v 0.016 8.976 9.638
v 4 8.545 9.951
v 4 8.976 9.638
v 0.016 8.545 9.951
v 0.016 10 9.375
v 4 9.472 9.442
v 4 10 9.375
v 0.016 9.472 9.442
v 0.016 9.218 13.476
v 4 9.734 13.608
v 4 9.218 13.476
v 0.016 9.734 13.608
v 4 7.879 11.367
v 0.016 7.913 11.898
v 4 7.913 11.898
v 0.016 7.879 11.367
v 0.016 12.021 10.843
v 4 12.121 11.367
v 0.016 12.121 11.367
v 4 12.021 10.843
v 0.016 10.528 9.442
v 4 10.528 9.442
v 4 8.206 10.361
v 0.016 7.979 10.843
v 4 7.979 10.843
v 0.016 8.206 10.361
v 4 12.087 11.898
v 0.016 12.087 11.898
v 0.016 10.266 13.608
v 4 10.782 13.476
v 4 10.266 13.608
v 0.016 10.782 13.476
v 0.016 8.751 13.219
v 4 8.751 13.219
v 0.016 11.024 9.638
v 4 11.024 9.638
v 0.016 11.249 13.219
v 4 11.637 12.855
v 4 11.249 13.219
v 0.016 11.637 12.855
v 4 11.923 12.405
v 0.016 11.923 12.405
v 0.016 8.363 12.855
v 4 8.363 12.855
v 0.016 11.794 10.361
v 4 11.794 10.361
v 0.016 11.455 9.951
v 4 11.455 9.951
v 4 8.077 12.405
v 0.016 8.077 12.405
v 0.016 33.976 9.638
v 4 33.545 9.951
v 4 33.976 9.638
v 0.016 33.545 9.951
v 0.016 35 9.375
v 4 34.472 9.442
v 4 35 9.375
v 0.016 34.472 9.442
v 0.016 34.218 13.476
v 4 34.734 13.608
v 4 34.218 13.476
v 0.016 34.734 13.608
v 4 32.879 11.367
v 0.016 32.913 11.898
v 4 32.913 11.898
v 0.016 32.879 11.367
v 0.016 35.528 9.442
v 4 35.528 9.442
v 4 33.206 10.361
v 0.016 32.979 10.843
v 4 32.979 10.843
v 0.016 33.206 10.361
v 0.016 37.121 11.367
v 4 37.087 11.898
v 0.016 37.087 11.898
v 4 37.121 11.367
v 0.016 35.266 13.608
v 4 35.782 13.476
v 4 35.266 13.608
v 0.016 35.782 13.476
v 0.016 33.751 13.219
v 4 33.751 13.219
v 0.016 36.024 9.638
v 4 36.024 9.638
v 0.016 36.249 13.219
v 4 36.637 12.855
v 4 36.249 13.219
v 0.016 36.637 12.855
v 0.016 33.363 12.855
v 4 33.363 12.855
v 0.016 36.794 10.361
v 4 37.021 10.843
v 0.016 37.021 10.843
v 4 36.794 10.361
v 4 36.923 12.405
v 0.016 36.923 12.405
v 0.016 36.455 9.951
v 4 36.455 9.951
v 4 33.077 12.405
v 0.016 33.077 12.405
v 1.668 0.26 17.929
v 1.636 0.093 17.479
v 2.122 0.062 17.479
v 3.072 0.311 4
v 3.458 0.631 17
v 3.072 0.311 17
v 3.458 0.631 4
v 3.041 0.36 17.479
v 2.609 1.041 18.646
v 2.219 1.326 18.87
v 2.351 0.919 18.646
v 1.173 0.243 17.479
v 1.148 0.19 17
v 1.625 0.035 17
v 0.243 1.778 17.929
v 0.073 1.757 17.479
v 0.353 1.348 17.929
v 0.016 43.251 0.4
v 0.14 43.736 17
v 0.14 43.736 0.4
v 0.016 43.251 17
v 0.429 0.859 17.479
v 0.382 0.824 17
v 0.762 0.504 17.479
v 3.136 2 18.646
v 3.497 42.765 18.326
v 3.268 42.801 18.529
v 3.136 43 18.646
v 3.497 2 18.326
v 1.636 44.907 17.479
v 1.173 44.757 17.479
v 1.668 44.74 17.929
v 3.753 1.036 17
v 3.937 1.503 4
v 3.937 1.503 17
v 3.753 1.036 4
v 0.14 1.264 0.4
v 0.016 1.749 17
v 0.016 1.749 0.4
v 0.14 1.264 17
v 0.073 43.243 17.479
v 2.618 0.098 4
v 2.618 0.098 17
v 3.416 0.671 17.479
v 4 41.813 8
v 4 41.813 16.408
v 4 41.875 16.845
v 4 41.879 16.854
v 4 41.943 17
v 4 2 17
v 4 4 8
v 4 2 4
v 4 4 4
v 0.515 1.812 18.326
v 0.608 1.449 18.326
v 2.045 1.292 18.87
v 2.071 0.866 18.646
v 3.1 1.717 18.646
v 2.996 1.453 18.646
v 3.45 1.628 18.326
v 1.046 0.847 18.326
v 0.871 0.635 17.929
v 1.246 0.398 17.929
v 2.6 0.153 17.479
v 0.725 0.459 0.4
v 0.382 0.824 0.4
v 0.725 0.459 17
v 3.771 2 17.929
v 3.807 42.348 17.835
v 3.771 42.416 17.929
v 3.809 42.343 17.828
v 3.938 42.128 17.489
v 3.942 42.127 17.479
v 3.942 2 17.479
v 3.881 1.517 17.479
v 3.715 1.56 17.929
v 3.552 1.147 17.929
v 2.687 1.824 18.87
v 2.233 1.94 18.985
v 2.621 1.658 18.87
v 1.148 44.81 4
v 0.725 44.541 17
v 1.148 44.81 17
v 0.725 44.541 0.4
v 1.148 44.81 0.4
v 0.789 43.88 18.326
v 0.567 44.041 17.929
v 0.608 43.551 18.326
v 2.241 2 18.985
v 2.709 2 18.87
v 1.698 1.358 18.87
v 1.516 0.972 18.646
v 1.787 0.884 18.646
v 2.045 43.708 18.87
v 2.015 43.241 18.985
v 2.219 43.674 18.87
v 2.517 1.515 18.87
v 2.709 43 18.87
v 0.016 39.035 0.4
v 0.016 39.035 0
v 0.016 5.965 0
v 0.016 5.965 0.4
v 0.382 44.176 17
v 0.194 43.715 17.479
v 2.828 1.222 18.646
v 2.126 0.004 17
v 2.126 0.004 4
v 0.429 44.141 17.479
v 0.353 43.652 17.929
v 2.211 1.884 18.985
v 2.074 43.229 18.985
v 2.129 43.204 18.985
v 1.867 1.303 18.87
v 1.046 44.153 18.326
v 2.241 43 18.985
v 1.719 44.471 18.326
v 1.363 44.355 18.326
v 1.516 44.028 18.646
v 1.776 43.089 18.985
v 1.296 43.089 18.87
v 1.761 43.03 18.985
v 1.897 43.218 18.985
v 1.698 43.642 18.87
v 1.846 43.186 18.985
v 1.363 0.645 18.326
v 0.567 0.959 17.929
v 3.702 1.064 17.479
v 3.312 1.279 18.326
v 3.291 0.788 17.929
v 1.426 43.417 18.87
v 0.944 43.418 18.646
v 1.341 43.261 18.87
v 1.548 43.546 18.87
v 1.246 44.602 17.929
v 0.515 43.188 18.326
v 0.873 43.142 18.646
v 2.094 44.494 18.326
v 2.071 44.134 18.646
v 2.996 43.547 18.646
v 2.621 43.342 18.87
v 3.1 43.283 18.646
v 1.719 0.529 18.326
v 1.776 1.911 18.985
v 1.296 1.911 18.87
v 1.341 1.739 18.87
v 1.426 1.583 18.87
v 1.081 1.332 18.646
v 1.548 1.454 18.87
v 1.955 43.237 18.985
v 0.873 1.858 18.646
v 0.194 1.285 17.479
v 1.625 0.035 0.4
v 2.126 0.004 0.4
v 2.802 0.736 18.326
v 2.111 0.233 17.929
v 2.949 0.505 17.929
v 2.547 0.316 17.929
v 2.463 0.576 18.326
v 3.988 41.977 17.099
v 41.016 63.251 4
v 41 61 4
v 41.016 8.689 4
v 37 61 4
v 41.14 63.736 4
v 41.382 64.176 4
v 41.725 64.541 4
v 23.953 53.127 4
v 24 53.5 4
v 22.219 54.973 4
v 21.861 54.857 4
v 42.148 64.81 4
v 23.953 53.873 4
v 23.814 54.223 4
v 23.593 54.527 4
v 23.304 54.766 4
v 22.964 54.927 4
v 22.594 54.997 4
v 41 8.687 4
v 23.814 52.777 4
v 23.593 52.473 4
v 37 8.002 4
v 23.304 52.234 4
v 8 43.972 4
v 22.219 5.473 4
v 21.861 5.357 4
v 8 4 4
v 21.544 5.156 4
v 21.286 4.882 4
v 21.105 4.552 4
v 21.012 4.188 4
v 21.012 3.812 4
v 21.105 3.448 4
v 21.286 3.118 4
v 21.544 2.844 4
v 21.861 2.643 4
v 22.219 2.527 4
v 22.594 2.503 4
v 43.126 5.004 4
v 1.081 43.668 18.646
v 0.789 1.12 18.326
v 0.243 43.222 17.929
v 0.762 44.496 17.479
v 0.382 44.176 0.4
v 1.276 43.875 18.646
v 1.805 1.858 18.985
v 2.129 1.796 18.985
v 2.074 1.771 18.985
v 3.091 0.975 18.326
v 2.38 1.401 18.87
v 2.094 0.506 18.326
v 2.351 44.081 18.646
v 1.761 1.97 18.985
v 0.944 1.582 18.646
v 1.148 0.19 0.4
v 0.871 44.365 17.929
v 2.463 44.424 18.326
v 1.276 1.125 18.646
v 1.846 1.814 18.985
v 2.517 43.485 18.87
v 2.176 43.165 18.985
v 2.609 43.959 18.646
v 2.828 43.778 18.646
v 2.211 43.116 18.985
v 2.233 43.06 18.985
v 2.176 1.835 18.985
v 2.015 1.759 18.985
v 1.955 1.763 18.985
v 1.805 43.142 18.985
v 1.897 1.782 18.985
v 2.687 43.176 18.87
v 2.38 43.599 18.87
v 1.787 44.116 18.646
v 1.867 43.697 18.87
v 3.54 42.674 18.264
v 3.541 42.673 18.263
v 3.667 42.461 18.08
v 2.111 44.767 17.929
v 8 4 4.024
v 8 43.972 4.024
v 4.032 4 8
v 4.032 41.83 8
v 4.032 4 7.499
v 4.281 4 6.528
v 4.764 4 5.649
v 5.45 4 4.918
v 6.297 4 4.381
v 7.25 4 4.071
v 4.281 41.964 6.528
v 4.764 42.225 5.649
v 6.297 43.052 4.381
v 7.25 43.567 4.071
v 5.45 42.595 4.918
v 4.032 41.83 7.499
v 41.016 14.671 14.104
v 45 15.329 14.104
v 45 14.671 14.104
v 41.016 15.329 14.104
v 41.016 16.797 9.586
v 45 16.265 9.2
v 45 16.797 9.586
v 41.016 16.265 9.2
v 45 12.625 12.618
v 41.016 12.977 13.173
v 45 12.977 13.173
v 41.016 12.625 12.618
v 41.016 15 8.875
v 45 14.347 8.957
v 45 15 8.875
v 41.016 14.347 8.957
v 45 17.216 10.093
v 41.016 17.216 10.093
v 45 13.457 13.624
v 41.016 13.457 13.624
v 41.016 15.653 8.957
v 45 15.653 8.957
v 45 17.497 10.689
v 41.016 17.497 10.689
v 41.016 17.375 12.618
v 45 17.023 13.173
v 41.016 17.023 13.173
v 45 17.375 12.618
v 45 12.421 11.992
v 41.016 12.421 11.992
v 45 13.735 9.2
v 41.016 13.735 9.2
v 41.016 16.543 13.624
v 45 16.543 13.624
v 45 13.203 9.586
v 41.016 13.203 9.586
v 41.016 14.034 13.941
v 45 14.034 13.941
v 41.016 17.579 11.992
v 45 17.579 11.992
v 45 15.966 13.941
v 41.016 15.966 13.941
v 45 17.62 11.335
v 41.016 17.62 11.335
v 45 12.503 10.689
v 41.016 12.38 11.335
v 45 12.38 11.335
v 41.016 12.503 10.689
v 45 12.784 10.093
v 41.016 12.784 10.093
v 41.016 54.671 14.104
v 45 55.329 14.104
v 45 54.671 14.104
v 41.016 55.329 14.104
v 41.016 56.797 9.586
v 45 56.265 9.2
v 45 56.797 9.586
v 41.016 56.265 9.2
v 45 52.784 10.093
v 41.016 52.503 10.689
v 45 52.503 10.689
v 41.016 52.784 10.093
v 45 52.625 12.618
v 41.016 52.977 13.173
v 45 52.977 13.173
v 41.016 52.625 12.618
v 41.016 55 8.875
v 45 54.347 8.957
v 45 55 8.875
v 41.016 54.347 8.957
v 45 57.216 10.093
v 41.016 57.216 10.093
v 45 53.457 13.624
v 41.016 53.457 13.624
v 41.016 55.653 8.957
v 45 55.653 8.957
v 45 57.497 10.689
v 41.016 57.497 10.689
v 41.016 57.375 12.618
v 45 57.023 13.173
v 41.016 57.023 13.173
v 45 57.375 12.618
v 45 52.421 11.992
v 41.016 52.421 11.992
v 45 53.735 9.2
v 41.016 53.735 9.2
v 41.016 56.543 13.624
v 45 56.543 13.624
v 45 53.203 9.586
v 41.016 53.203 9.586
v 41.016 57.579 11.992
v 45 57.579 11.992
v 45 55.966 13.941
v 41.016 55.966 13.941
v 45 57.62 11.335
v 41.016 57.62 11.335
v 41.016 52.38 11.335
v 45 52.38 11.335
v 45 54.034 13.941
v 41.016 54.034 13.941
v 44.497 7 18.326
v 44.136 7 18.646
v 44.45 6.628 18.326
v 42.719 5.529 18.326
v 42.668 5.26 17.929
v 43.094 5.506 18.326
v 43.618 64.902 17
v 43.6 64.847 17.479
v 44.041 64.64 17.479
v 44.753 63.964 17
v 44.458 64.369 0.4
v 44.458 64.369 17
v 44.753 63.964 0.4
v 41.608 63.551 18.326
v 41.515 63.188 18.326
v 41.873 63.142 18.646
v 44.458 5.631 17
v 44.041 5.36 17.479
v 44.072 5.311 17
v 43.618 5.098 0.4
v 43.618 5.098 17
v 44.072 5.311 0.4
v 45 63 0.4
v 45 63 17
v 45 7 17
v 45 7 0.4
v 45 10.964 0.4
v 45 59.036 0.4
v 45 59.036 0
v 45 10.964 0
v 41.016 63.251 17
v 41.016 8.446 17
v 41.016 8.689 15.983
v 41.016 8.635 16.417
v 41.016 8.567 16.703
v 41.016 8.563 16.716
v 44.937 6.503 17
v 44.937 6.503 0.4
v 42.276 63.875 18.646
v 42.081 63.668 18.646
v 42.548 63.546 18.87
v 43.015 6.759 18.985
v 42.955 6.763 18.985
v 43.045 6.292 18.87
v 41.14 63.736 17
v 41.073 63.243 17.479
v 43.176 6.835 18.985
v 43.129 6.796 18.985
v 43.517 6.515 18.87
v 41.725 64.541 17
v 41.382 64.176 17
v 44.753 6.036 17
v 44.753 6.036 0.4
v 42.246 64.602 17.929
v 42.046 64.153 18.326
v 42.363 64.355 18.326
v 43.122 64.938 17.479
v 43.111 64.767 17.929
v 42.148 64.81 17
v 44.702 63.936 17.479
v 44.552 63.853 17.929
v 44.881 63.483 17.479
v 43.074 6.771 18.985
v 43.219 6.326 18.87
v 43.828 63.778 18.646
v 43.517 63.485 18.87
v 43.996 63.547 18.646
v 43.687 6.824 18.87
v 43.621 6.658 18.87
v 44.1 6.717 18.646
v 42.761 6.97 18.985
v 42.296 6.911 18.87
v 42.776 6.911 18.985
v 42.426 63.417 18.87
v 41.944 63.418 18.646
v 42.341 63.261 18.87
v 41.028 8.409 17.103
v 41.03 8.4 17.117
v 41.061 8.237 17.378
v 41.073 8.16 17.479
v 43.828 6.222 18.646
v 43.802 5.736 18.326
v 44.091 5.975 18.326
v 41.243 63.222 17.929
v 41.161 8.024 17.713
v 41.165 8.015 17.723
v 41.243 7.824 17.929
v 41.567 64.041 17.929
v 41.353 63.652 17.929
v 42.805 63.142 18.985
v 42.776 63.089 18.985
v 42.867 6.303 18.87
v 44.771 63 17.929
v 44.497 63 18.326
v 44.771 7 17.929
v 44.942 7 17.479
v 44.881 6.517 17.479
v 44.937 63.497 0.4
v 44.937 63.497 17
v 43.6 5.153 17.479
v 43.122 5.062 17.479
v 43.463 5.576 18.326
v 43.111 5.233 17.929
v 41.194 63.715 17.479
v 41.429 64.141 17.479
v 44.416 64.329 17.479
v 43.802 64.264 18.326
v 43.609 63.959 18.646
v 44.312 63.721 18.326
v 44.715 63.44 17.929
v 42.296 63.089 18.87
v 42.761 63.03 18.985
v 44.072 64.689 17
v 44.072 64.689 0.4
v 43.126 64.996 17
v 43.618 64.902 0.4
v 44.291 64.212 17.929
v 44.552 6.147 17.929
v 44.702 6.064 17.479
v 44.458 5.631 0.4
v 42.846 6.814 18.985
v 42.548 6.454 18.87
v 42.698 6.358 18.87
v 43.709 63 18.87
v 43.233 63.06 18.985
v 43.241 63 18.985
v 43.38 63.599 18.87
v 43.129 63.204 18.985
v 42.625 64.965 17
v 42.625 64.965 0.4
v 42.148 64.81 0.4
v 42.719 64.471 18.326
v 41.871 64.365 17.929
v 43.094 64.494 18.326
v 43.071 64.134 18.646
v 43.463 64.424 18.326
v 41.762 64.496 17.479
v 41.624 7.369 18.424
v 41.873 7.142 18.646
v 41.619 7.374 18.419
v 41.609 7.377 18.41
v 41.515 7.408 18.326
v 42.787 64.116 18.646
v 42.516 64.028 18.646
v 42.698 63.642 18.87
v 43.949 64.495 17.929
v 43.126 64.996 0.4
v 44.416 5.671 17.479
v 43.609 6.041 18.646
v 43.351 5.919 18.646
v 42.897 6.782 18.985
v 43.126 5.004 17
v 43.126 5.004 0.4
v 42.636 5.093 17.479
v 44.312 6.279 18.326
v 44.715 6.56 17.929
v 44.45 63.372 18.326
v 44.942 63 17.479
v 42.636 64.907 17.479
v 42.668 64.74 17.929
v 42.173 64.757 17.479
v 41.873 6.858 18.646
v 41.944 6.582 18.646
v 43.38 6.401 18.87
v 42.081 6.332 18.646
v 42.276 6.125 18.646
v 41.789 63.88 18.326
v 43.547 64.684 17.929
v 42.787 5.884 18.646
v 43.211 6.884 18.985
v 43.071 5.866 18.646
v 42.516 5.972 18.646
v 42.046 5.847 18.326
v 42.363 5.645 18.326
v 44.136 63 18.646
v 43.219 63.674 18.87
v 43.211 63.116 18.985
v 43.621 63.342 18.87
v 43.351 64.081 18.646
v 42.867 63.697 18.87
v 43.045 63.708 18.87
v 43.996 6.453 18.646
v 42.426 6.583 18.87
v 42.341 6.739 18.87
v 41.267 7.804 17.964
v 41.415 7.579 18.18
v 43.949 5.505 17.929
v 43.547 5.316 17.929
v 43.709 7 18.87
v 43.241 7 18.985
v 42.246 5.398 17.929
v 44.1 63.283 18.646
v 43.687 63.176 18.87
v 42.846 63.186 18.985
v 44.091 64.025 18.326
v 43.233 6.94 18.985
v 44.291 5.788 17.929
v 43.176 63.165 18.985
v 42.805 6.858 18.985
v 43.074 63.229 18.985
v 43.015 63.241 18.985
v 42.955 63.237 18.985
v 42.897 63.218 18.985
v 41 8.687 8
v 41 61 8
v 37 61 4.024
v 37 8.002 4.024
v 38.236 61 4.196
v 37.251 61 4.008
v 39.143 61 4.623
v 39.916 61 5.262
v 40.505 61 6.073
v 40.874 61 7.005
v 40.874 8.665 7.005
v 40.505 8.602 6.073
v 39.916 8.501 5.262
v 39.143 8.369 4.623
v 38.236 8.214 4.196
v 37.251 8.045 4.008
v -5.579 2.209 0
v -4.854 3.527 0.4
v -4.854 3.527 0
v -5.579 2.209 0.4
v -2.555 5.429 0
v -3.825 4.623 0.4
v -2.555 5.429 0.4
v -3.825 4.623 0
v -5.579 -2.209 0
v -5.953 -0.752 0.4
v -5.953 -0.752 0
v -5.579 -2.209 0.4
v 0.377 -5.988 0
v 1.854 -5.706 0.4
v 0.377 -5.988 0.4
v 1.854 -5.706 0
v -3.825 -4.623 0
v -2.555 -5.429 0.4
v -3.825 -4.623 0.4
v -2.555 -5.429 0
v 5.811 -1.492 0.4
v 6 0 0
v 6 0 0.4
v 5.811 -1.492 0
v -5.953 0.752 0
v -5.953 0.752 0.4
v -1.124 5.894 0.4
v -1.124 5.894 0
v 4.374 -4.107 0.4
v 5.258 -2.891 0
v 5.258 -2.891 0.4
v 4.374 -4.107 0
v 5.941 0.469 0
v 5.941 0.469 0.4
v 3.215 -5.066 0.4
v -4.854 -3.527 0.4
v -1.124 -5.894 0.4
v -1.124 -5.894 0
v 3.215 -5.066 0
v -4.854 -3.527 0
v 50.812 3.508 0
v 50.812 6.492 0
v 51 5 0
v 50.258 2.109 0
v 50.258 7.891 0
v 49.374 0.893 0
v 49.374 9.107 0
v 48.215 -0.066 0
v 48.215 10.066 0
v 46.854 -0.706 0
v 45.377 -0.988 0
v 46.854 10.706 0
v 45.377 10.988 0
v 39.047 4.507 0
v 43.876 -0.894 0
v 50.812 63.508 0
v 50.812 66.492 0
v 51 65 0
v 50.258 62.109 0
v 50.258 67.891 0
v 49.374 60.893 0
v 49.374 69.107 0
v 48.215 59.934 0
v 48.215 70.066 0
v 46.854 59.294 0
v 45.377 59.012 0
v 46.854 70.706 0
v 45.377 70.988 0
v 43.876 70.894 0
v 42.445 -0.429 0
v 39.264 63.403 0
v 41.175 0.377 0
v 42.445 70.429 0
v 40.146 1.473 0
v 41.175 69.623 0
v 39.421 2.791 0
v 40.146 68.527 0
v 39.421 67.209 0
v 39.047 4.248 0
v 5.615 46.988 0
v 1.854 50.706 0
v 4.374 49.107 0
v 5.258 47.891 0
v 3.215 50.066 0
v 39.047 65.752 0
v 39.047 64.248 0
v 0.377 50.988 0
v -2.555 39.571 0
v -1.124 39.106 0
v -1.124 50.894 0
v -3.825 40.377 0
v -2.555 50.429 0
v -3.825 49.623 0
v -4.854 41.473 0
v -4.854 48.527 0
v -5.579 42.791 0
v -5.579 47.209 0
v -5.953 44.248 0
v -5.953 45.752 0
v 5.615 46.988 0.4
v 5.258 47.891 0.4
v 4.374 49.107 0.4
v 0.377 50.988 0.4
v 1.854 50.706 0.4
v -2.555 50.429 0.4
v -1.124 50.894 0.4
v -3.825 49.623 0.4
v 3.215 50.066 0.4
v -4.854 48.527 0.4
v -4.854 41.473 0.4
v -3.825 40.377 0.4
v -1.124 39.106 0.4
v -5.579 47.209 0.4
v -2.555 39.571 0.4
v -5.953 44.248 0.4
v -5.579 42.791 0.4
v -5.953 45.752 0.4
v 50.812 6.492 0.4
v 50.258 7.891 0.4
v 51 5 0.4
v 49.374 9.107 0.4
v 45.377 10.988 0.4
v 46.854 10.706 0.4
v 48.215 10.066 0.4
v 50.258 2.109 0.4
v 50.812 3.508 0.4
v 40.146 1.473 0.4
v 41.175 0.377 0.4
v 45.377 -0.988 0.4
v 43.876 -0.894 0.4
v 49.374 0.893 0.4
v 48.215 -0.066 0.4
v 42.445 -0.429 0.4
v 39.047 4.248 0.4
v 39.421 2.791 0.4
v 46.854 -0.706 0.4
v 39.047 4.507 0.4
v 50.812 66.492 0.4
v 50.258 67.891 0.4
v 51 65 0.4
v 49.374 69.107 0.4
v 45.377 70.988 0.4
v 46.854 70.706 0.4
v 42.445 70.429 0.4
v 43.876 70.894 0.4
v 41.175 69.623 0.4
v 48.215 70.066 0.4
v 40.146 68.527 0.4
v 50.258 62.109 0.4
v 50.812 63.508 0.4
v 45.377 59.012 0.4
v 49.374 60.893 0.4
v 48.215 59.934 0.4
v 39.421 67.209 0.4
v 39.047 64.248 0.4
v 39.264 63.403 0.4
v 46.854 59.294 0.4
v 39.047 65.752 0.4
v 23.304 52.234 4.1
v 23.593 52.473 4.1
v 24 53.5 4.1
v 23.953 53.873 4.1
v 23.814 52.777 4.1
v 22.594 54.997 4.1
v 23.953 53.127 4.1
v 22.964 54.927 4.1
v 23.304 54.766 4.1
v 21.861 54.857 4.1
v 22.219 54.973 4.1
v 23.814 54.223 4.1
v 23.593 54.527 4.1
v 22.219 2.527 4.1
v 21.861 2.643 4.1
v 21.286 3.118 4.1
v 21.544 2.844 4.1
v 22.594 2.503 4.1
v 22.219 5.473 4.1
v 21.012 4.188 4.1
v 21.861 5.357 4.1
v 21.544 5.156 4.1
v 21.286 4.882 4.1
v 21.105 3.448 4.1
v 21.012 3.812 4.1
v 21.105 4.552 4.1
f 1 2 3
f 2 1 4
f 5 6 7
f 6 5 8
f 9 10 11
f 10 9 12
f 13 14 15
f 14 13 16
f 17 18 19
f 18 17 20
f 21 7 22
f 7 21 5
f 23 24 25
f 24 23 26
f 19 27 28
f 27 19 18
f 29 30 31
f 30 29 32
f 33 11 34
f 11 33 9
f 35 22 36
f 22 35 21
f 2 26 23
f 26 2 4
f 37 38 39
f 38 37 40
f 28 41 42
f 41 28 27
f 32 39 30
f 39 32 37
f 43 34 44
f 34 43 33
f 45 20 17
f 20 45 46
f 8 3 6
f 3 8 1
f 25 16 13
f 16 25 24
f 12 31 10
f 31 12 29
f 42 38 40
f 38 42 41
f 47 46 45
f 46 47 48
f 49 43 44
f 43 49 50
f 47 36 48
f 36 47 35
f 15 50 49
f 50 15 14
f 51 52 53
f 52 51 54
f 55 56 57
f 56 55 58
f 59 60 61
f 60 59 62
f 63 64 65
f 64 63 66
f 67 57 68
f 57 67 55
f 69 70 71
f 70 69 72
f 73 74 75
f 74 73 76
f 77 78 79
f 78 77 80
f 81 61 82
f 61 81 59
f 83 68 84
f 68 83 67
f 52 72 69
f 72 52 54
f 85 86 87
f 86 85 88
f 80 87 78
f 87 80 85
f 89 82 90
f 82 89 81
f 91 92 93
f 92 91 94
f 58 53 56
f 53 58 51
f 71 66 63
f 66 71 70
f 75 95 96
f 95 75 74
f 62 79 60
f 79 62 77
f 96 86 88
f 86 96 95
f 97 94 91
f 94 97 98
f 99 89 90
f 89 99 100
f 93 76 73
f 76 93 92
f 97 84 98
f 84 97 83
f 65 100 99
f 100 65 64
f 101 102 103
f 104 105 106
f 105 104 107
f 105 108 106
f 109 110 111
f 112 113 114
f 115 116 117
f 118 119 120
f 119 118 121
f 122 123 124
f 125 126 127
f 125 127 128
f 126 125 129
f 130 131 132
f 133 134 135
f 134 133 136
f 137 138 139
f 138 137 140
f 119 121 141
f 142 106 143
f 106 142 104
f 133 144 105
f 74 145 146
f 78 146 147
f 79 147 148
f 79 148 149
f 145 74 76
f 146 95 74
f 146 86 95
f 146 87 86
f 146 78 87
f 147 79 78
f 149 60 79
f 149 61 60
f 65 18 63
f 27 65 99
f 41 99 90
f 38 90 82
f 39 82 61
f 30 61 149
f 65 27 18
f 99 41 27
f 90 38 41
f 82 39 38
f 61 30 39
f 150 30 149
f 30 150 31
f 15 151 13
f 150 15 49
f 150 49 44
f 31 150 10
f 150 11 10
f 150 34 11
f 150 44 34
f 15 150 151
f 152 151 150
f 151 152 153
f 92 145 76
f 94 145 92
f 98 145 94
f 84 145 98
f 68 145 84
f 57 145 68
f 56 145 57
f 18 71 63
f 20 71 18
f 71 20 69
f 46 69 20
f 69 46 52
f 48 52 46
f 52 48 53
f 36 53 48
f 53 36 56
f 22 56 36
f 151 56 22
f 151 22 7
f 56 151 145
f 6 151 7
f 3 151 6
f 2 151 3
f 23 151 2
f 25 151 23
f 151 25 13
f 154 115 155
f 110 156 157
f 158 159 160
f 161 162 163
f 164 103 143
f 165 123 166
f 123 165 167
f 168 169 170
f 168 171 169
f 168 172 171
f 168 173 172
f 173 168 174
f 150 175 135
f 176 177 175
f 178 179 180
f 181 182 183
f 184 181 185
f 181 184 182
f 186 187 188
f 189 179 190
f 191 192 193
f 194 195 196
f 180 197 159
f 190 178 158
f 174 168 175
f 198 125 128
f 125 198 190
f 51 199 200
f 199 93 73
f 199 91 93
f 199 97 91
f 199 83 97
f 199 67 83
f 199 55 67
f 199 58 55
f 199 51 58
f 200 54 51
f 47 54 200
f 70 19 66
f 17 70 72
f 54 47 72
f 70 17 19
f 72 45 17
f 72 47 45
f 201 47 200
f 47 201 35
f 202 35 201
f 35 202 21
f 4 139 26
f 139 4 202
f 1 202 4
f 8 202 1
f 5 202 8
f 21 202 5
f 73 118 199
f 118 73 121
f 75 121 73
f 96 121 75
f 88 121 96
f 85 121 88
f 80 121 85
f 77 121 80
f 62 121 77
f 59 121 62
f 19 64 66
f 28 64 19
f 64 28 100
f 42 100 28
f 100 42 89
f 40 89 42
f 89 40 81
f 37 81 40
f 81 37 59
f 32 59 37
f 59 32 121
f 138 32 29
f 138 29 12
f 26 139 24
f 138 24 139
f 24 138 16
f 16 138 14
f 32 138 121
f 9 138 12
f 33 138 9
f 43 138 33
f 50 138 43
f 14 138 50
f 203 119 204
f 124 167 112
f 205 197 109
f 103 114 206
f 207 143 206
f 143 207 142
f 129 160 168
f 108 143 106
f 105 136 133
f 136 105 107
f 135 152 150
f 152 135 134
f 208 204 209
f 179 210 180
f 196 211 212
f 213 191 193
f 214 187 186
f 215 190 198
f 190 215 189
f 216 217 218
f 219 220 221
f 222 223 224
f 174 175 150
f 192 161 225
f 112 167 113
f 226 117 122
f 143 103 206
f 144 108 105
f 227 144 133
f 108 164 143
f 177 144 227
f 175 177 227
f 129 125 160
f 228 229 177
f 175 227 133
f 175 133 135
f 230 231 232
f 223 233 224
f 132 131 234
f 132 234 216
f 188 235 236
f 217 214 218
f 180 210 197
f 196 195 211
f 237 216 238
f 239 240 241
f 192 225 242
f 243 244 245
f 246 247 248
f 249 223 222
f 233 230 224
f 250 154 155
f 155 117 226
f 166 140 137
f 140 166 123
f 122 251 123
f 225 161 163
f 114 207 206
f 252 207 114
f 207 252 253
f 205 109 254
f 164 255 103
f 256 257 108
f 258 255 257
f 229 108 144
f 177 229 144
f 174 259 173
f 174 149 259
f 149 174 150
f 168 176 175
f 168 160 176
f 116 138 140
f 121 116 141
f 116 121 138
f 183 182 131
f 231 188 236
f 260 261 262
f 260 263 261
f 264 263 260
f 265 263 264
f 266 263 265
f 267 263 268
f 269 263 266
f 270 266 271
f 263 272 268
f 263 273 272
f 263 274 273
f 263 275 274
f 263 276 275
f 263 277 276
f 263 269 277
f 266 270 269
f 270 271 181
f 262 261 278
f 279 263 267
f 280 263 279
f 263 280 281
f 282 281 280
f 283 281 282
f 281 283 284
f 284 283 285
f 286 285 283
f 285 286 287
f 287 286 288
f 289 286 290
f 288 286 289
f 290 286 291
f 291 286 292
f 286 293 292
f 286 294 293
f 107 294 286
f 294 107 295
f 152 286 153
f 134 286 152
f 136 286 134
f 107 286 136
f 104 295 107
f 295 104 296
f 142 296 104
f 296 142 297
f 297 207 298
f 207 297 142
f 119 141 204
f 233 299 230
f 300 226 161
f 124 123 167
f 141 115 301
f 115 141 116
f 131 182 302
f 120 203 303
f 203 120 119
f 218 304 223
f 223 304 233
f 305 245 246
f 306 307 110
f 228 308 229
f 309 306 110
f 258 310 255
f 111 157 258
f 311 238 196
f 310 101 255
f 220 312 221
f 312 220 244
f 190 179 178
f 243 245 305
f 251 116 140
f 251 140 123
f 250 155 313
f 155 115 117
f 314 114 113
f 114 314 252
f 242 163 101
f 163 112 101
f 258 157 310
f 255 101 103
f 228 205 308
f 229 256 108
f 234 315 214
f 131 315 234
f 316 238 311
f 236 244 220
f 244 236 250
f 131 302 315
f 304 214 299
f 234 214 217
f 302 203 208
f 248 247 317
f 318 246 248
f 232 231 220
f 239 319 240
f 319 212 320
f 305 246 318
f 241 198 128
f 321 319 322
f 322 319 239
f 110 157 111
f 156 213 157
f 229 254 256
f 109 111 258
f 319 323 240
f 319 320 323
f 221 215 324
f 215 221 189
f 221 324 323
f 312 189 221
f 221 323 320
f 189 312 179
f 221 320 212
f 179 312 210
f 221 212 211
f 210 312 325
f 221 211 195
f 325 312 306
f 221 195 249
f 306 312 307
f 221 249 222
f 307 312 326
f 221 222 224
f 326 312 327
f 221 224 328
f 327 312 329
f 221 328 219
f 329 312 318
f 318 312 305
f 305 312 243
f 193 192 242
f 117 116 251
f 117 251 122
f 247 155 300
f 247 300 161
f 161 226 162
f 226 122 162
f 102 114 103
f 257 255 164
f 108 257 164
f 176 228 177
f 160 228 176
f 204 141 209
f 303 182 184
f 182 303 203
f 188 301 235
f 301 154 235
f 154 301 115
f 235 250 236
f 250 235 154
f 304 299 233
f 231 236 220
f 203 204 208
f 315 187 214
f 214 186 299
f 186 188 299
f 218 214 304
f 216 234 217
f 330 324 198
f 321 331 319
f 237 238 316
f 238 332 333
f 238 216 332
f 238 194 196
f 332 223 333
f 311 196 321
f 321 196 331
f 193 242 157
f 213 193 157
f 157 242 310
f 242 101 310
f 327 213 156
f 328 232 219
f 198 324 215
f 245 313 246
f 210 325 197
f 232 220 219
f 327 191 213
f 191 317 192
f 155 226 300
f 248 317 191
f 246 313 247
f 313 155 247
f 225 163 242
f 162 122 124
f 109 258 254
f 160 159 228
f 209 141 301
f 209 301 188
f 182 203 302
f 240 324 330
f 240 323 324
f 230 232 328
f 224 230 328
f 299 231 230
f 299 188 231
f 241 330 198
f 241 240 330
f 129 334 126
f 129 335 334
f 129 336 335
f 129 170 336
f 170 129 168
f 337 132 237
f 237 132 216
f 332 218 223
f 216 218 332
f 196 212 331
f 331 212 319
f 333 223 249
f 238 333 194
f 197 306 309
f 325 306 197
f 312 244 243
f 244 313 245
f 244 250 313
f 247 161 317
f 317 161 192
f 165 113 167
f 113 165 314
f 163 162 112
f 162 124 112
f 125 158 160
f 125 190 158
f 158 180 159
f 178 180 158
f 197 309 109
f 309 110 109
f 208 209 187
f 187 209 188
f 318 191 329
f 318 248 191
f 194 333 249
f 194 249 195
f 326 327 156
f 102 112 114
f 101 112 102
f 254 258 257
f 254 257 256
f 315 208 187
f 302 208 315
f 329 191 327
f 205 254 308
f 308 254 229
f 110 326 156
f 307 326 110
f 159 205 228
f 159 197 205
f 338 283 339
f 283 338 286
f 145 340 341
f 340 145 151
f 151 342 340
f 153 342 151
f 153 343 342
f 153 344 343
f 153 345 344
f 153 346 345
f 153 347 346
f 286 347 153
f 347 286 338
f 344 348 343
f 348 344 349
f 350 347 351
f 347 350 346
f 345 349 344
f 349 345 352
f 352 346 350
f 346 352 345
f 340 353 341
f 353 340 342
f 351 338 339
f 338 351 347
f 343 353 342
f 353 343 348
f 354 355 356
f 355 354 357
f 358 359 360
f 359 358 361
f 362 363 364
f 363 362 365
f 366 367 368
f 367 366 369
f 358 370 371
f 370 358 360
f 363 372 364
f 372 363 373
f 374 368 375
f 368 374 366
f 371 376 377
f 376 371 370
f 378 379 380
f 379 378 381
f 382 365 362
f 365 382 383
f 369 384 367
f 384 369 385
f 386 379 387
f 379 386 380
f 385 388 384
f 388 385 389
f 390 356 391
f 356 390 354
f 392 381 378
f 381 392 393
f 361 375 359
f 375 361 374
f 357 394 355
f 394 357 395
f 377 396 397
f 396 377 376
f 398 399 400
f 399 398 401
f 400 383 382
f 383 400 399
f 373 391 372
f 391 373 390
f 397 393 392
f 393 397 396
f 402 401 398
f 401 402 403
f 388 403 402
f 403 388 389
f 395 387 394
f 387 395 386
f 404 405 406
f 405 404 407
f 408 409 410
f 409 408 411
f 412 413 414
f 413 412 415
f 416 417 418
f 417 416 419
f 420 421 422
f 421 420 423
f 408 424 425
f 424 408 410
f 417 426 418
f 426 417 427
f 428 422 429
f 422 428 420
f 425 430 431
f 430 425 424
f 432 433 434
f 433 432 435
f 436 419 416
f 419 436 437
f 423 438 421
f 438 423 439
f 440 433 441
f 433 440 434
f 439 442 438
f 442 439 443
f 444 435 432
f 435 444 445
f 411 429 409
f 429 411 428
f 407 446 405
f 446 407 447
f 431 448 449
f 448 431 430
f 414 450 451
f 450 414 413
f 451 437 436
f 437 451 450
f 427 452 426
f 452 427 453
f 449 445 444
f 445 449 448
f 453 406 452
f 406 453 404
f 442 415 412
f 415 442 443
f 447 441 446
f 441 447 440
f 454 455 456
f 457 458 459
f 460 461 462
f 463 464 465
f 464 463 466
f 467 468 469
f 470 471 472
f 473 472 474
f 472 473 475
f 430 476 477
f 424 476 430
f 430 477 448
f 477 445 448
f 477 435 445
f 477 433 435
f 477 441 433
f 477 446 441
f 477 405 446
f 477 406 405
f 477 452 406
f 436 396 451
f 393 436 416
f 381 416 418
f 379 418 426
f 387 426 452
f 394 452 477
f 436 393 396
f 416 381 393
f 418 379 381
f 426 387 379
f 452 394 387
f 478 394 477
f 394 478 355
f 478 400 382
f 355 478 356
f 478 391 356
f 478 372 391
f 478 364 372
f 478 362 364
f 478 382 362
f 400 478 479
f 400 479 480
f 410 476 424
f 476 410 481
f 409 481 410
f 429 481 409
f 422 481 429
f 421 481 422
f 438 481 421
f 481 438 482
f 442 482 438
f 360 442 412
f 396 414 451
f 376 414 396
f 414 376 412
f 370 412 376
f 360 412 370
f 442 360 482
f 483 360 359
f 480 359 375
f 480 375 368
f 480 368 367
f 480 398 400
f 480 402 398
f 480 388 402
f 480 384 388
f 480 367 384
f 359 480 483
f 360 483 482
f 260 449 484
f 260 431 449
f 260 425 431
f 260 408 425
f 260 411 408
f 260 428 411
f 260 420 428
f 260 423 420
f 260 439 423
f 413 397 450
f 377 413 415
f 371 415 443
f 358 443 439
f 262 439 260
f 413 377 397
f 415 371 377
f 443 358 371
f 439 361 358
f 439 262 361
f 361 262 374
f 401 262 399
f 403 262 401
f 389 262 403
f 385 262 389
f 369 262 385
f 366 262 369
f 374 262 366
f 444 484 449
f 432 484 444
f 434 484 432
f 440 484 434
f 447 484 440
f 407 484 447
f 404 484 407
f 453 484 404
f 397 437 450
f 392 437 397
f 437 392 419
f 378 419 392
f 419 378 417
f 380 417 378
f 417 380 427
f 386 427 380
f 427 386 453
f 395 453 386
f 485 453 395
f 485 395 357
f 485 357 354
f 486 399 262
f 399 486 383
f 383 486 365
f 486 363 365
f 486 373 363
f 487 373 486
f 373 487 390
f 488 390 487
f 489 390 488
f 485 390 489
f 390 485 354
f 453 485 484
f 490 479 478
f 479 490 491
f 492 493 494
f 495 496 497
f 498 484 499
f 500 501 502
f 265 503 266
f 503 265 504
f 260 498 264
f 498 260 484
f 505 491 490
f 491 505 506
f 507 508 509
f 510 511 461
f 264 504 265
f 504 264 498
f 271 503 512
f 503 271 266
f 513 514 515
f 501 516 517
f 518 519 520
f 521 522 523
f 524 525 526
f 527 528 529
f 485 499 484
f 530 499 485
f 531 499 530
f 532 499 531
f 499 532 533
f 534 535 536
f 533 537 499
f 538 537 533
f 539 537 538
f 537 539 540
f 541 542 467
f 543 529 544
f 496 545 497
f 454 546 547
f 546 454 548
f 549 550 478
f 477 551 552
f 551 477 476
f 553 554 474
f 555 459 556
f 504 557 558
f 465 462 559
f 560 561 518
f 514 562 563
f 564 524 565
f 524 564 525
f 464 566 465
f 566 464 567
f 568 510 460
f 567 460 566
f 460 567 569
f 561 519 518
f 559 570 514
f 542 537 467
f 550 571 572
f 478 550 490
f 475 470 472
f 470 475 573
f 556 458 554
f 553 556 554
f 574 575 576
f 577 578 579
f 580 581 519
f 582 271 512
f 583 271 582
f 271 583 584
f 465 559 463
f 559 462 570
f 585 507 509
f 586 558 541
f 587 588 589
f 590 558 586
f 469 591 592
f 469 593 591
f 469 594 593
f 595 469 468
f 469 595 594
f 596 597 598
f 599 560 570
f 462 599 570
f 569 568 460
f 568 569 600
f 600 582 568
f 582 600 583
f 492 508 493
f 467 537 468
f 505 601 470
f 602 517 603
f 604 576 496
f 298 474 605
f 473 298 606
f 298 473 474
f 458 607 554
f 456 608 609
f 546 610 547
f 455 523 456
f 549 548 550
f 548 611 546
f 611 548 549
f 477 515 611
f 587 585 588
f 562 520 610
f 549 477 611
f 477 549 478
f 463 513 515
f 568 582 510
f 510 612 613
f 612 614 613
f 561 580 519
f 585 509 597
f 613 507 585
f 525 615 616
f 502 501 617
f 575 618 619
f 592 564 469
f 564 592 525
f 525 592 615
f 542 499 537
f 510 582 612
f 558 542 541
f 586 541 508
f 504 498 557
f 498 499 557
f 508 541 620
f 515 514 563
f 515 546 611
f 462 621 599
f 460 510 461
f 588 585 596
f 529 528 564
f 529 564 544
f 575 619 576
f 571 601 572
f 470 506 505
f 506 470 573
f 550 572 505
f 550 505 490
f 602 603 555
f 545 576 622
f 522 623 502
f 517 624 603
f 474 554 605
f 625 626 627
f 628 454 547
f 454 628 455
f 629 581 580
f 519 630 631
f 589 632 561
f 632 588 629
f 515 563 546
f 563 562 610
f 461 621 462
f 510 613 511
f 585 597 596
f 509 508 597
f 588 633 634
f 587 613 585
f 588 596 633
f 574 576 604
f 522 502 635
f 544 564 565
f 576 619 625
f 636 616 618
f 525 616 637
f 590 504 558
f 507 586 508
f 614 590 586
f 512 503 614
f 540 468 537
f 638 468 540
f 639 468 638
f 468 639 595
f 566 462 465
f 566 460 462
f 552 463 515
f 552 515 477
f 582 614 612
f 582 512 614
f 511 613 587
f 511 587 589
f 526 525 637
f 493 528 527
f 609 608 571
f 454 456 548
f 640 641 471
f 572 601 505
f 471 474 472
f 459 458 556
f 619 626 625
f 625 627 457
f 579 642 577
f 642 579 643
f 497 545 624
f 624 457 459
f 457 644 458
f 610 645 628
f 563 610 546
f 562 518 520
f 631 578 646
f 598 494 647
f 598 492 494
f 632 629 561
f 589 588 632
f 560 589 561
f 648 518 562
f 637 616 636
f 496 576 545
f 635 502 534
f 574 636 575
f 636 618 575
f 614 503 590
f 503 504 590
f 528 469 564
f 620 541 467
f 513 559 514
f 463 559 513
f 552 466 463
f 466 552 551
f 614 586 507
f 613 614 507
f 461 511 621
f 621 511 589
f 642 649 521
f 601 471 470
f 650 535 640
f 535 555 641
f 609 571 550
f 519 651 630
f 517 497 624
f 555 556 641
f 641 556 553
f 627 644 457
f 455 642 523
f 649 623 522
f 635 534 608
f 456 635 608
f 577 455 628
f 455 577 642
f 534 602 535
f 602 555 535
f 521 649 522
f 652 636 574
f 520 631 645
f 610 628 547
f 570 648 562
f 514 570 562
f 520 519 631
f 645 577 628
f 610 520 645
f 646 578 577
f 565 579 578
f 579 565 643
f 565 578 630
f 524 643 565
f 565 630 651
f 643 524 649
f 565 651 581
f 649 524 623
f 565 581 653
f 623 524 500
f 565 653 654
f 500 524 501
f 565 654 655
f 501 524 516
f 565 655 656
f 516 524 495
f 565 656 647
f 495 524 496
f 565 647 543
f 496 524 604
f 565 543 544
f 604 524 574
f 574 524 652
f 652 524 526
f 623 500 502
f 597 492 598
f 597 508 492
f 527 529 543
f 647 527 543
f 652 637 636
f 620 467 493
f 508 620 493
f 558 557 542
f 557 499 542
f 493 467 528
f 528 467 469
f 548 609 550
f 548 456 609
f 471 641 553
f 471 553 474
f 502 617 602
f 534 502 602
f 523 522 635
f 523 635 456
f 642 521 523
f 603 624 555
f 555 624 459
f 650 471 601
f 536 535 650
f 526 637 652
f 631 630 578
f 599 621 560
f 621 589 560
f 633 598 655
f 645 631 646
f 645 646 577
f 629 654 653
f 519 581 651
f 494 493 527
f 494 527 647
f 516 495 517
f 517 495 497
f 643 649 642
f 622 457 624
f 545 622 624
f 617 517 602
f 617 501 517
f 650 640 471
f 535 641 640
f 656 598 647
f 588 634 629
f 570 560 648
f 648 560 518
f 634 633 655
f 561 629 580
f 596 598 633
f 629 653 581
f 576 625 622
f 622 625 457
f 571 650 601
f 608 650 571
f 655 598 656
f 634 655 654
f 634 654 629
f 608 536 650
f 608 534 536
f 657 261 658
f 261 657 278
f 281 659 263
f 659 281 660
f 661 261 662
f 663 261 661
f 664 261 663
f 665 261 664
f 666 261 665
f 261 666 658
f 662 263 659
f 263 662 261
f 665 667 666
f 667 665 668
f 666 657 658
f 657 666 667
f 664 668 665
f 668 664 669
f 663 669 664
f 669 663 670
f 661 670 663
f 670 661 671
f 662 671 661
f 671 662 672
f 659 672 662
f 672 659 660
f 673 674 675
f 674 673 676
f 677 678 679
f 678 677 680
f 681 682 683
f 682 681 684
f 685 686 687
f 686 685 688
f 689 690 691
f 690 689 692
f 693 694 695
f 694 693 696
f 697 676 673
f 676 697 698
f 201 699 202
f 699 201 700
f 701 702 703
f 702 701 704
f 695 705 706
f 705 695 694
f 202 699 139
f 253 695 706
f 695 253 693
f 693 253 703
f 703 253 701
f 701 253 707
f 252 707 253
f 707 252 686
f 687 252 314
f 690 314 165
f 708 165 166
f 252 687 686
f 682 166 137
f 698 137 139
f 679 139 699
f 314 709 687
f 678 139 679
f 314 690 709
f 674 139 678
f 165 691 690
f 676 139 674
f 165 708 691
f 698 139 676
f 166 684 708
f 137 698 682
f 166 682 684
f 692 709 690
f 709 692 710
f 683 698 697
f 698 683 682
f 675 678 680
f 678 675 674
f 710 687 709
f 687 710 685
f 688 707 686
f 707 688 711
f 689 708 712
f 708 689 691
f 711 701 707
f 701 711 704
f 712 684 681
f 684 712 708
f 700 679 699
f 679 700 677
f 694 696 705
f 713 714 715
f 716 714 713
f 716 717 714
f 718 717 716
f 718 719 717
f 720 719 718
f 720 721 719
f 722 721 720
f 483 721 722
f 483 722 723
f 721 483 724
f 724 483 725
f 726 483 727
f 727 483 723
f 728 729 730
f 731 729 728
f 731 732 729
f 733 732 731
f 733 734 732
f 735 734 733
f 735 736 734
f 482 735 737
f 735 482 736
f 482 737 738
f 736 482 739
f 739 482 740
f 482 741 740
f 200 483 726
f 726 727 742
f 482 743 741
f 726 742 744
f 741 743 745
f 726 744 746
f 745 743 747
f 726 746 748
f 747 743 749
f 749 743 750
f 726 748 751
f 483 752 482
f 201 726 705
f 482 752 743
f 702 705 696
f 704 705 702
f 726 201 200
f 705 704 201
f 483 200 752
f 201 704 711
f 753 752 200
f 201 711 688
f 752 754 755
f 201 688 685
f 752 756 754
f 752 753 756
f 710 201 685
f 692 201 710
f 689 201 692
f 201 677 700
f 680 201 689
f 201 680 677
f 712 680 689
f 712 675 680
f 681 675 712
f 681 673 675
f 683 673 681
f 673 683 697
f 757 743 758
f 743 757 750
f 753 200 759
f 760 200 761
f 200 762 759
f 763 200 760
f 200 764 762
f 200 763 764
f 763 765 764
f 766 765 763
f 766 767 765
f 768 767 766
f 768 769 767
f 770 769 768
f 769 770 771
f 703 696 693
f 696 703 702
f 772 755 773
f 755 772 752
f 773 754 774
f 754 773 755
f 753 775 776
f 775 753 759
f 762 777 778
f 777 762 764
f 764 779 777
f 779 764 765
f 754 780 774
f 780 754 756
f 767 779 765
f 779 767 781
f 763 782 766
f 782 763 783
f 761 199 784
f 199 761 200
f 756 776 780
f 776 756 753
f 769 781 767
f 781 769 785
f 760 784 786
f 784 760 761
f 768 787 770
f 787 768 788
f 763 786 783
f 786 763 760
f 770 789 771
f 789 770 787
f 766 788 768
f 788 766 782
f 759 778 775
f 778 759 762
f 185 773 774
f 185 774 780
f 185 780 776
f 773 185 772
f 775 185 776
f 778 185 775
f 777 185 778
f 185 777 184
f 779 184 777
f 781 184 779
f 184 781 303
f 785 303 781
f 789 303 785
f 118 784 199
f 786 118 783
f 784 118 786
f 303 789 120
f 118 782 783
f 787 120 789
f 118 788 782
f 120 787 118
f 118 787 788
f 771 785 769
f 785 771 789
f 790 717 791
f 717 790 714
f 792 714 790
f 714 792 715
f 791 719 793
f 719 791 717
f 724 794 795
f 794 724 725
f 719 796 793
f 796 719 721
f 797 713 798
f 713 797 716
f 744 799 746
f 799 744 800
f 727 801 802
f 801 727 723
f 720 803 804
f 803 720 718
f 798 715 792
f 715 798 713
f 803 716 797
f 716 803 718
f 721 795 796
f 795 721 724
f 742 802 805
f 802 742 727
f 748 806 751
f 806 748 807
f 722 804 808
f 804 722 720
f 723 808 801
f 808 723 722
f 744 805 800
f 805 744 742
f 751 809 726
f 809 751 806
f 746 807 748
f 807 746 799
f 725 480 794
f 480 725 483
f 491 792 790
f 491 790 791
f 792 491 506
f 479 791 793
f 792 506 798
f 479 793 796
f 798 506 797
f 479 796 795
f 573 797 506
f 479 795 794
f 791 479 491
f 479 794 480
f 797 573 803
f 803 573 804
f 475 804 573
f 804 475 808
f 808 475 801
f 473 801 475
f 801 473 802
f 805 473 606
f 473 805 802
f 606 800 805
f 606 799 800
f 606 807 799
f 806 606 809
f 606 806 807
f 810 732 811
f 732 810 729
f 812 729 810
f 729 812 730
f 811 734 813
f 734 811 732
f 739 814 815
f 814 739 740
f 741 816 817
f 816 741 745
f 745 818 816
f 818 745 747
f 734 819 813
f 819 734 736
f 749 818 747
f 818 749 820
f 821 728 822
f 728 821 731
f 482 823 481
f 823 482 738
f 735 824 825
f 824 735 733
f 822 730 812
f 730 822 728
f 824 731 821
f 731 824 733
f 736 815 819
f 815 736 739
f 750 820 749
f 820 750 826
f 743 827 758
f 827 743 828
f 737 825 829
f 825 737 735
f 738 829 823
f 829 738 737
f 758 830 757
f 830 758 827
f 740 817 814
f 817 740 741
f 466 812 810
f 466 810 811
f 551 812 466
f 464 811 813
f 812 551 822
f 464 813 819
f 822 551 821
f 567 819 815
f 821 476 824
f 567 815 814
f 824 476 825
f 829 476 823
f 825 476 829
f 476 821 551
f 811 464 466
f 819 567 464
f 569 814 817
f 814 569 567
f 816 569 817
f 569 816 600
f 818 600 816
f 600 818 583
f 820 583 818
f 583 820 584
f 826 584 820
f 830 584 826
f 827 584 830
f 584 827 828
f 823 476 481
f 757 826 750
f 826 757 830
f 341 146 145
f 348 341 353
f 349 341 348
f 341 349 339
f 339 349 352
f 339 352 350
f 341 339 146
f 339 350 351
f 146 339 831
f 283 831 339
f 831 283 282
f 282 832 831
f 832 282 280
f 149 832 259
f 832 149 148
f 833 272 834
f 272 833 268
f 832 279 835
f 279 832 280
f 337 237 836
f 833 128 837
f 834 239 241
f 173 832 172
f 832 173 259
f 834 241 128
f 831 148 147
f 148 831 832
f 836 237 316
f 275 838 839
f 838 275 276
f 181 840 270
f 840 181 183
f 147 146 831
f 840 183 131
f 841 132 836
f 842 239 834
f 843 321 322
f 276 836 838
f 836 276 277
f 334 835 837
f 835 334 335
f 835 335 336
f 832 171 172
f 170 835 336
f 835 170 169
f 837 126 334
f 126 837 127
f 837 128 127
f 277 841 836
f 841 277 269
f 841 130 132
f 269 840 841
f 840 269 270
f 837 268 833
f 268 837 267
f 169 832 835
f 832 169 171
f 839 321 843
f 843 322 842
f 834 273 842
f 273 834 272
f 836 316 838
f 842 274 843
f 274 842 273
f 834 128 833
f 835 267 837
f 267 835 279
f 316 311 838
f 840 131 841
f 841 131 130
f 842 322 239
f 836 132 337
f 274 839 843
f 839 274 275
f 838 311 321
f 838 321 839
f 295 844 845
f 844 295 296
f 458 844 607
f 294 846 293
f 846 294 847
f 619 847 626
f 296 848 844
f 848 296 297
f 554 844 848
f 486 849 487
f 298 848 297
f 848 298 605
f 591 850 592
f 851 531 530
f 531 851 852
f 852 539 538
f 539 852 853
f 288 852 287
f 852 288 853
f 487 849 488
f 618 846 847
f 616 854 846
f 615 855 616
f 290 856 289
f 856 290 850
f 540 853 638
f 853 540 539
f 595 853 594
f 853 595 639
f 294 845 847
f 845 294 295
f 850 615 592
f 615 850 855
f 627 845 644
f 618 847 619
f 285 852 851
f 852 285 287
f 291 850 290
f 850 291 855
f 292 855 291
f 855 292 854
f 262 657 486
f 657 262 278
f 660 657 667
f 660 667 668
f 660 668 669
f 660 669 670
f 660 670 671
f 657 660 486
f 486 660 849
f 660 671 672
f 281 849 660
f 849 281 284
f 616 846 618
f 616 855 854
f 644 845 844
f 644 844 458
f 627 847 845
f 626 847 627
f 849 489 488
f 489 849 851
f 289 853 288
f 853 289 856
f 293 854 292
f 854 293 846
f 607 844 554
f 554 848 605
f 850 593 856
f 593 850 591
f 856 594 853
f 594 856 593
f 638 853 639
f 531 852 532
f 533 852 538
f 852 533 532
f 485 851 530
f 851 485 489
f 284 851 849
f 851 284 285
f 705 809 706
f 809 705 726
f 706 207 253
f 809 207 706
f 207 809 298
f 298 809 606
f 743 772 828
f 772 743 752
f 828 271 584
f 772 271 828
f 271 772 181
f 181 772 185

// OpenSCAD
// K250-PSU-Mount-Bracket
// thingiverse: 619430
// License: LGPL
// Kai Dupke, 2014-12-15
//
// Mounts for the K250 (or other standard) PSU
//
// history:
// Kai Dupke, 2015-01-03
//		adjust offset, make holes wider
// Kai Dupke, 2014-12-29
//		round it
// Kai Dupke, 2014-12-29
//		initial version


$fn=25; // make circles round (>=60) or not (<60), for testing 10 is good 

X=0.25; // a little bit extra to make sure holes are not too tight



thick=4; // makes a regular M5x10 fit well for the frame
wing_thick=3;

psu_l=25+10+10;
psu_w=15;
psu_screw=4;
psu_hole=[10,10+25];

frame_l=20+20+20;
frame_w=15;
frame_screw=5;
frame_hole=[10,frame_l-10];
frame_offset=5; 

distance=45;


// settings for brim shim
brim_hight=0.4;
brim_r=6;
brims=[
		[0,0],
		[0,psu_l],
		[distance,frame_offset],
		[distance,frame_offset+frame_l],
		];

// mount
// PSU side
difference(){
	hull(){
		translate([thick/2,thick/2,thick])
			cylinder(d=thick,0.1);

		translate([thick/2,thick/2,thick+psu_w-thick/2])
			sphere(d=thick);

		translate([thick/2,psu_l-thick/2,thick])
			cylinder(d=thick,0.1);

		translate([thick/2,psu_l-thick/2,thick+psu_w-thick/2])
			sphere(d=thick);
	}

	for (y = psu_hole) 
		translate([-X,y,psu_w/2+thick])
		rotate([0,90,0])
		cylinder(d=psu_screw+X,thick+2*X);
}


difference(){
	translate([thick,thick,thick])
		cube([thick,psu_l-thick,thick]);

	translate([thick+thick,thick-X,thick+thick])
		rotate([-90,0,0])
		cylinder(r=thick,psu_l-thick+2*X);
	
}


// stabilize wing
// frame side

hull(){
	translate([thick/2,psu_l-thick/2,thick])
		cylinder(d=thick,0.1);

	translate([thick/2,psu_l-thick/2,psu_w-thick/2+thick])
		sphere(d=thick);

	translate([distance/2,frame_offset/2+psu_l+(frame_l-psu_l)/2-wing_thick/2,thick])
		cylinder(d=wing_thick,0.10);
}



// mount
// frame side
	difference(){
		hull(){
			translate([distance-thick/2,frame_offset+thick/2,thick])
				cylinder(d=thick,0.1);

			translate([distance-thick/2,frame_offset+thick/2,thick+frame_w-thick/2])
				sphere(d=thick);

			translate([distance-thick/2,frame_offset+frame_l-thick/2,thick])
				cylinder(d=thick,0.1);

			translate([distance-thick/2,frame_offset+frame_l-thick/2,thick+frame_w-thick/2])
				sphere(d=thick);
		}

		for (y = frame_hole) 
			translate([distance-thick-X,y+frame_offset,frame_w/2+thick])
			rotate([0,90,0])
			cylinder(d=frame_screw+X,thick+2*X);
	}



difference(){
	translate([distance-2*thick,frame_offset,thick])
		cube([thick,frame_l-thick,thick]);

	translate([distance-2*thick,frame_offset-X,thick+thick])
		rotate([-90,0,0])
		cylinder(r=thick,frame_l-thick+2*X);
	
}

// stabilize wing
// Frame side
hull(){
	translate([distance/2,frame_offset/2+wing_thick/2,thick])
		cylinder(d=wing_thick,0.1);

	translate([distance-thick/2,frame_offset+thick/2,thick])
		cylinder(d=thick,0.1);

	translate([distance-thick/2,frame_offset+thick/2,thick+frame_w-thick/2])
		sphere(d=thick);
}




// connection plate
hull(){
	translate([thick/2,psu_l-thick/2,0])
		cylinder(d=thick,thick);

	translate([thick/2,thick/2,0])
		cylinder(d=thick,thick);

	translate([distance-thick/2,frame_offset+thick/2,0])
		cylinder(d=thick,thick);

	translate([distance-thick/2,frame_offset+frame_l-thick/2,0])
		cylinder(d=thick,thick);
}

brim(brims);

module brim(brim_pos) {
	for (pos = brim_pos) {
		translate (pos) cylinder(r=brim_r,brim_hight);
	}
}
